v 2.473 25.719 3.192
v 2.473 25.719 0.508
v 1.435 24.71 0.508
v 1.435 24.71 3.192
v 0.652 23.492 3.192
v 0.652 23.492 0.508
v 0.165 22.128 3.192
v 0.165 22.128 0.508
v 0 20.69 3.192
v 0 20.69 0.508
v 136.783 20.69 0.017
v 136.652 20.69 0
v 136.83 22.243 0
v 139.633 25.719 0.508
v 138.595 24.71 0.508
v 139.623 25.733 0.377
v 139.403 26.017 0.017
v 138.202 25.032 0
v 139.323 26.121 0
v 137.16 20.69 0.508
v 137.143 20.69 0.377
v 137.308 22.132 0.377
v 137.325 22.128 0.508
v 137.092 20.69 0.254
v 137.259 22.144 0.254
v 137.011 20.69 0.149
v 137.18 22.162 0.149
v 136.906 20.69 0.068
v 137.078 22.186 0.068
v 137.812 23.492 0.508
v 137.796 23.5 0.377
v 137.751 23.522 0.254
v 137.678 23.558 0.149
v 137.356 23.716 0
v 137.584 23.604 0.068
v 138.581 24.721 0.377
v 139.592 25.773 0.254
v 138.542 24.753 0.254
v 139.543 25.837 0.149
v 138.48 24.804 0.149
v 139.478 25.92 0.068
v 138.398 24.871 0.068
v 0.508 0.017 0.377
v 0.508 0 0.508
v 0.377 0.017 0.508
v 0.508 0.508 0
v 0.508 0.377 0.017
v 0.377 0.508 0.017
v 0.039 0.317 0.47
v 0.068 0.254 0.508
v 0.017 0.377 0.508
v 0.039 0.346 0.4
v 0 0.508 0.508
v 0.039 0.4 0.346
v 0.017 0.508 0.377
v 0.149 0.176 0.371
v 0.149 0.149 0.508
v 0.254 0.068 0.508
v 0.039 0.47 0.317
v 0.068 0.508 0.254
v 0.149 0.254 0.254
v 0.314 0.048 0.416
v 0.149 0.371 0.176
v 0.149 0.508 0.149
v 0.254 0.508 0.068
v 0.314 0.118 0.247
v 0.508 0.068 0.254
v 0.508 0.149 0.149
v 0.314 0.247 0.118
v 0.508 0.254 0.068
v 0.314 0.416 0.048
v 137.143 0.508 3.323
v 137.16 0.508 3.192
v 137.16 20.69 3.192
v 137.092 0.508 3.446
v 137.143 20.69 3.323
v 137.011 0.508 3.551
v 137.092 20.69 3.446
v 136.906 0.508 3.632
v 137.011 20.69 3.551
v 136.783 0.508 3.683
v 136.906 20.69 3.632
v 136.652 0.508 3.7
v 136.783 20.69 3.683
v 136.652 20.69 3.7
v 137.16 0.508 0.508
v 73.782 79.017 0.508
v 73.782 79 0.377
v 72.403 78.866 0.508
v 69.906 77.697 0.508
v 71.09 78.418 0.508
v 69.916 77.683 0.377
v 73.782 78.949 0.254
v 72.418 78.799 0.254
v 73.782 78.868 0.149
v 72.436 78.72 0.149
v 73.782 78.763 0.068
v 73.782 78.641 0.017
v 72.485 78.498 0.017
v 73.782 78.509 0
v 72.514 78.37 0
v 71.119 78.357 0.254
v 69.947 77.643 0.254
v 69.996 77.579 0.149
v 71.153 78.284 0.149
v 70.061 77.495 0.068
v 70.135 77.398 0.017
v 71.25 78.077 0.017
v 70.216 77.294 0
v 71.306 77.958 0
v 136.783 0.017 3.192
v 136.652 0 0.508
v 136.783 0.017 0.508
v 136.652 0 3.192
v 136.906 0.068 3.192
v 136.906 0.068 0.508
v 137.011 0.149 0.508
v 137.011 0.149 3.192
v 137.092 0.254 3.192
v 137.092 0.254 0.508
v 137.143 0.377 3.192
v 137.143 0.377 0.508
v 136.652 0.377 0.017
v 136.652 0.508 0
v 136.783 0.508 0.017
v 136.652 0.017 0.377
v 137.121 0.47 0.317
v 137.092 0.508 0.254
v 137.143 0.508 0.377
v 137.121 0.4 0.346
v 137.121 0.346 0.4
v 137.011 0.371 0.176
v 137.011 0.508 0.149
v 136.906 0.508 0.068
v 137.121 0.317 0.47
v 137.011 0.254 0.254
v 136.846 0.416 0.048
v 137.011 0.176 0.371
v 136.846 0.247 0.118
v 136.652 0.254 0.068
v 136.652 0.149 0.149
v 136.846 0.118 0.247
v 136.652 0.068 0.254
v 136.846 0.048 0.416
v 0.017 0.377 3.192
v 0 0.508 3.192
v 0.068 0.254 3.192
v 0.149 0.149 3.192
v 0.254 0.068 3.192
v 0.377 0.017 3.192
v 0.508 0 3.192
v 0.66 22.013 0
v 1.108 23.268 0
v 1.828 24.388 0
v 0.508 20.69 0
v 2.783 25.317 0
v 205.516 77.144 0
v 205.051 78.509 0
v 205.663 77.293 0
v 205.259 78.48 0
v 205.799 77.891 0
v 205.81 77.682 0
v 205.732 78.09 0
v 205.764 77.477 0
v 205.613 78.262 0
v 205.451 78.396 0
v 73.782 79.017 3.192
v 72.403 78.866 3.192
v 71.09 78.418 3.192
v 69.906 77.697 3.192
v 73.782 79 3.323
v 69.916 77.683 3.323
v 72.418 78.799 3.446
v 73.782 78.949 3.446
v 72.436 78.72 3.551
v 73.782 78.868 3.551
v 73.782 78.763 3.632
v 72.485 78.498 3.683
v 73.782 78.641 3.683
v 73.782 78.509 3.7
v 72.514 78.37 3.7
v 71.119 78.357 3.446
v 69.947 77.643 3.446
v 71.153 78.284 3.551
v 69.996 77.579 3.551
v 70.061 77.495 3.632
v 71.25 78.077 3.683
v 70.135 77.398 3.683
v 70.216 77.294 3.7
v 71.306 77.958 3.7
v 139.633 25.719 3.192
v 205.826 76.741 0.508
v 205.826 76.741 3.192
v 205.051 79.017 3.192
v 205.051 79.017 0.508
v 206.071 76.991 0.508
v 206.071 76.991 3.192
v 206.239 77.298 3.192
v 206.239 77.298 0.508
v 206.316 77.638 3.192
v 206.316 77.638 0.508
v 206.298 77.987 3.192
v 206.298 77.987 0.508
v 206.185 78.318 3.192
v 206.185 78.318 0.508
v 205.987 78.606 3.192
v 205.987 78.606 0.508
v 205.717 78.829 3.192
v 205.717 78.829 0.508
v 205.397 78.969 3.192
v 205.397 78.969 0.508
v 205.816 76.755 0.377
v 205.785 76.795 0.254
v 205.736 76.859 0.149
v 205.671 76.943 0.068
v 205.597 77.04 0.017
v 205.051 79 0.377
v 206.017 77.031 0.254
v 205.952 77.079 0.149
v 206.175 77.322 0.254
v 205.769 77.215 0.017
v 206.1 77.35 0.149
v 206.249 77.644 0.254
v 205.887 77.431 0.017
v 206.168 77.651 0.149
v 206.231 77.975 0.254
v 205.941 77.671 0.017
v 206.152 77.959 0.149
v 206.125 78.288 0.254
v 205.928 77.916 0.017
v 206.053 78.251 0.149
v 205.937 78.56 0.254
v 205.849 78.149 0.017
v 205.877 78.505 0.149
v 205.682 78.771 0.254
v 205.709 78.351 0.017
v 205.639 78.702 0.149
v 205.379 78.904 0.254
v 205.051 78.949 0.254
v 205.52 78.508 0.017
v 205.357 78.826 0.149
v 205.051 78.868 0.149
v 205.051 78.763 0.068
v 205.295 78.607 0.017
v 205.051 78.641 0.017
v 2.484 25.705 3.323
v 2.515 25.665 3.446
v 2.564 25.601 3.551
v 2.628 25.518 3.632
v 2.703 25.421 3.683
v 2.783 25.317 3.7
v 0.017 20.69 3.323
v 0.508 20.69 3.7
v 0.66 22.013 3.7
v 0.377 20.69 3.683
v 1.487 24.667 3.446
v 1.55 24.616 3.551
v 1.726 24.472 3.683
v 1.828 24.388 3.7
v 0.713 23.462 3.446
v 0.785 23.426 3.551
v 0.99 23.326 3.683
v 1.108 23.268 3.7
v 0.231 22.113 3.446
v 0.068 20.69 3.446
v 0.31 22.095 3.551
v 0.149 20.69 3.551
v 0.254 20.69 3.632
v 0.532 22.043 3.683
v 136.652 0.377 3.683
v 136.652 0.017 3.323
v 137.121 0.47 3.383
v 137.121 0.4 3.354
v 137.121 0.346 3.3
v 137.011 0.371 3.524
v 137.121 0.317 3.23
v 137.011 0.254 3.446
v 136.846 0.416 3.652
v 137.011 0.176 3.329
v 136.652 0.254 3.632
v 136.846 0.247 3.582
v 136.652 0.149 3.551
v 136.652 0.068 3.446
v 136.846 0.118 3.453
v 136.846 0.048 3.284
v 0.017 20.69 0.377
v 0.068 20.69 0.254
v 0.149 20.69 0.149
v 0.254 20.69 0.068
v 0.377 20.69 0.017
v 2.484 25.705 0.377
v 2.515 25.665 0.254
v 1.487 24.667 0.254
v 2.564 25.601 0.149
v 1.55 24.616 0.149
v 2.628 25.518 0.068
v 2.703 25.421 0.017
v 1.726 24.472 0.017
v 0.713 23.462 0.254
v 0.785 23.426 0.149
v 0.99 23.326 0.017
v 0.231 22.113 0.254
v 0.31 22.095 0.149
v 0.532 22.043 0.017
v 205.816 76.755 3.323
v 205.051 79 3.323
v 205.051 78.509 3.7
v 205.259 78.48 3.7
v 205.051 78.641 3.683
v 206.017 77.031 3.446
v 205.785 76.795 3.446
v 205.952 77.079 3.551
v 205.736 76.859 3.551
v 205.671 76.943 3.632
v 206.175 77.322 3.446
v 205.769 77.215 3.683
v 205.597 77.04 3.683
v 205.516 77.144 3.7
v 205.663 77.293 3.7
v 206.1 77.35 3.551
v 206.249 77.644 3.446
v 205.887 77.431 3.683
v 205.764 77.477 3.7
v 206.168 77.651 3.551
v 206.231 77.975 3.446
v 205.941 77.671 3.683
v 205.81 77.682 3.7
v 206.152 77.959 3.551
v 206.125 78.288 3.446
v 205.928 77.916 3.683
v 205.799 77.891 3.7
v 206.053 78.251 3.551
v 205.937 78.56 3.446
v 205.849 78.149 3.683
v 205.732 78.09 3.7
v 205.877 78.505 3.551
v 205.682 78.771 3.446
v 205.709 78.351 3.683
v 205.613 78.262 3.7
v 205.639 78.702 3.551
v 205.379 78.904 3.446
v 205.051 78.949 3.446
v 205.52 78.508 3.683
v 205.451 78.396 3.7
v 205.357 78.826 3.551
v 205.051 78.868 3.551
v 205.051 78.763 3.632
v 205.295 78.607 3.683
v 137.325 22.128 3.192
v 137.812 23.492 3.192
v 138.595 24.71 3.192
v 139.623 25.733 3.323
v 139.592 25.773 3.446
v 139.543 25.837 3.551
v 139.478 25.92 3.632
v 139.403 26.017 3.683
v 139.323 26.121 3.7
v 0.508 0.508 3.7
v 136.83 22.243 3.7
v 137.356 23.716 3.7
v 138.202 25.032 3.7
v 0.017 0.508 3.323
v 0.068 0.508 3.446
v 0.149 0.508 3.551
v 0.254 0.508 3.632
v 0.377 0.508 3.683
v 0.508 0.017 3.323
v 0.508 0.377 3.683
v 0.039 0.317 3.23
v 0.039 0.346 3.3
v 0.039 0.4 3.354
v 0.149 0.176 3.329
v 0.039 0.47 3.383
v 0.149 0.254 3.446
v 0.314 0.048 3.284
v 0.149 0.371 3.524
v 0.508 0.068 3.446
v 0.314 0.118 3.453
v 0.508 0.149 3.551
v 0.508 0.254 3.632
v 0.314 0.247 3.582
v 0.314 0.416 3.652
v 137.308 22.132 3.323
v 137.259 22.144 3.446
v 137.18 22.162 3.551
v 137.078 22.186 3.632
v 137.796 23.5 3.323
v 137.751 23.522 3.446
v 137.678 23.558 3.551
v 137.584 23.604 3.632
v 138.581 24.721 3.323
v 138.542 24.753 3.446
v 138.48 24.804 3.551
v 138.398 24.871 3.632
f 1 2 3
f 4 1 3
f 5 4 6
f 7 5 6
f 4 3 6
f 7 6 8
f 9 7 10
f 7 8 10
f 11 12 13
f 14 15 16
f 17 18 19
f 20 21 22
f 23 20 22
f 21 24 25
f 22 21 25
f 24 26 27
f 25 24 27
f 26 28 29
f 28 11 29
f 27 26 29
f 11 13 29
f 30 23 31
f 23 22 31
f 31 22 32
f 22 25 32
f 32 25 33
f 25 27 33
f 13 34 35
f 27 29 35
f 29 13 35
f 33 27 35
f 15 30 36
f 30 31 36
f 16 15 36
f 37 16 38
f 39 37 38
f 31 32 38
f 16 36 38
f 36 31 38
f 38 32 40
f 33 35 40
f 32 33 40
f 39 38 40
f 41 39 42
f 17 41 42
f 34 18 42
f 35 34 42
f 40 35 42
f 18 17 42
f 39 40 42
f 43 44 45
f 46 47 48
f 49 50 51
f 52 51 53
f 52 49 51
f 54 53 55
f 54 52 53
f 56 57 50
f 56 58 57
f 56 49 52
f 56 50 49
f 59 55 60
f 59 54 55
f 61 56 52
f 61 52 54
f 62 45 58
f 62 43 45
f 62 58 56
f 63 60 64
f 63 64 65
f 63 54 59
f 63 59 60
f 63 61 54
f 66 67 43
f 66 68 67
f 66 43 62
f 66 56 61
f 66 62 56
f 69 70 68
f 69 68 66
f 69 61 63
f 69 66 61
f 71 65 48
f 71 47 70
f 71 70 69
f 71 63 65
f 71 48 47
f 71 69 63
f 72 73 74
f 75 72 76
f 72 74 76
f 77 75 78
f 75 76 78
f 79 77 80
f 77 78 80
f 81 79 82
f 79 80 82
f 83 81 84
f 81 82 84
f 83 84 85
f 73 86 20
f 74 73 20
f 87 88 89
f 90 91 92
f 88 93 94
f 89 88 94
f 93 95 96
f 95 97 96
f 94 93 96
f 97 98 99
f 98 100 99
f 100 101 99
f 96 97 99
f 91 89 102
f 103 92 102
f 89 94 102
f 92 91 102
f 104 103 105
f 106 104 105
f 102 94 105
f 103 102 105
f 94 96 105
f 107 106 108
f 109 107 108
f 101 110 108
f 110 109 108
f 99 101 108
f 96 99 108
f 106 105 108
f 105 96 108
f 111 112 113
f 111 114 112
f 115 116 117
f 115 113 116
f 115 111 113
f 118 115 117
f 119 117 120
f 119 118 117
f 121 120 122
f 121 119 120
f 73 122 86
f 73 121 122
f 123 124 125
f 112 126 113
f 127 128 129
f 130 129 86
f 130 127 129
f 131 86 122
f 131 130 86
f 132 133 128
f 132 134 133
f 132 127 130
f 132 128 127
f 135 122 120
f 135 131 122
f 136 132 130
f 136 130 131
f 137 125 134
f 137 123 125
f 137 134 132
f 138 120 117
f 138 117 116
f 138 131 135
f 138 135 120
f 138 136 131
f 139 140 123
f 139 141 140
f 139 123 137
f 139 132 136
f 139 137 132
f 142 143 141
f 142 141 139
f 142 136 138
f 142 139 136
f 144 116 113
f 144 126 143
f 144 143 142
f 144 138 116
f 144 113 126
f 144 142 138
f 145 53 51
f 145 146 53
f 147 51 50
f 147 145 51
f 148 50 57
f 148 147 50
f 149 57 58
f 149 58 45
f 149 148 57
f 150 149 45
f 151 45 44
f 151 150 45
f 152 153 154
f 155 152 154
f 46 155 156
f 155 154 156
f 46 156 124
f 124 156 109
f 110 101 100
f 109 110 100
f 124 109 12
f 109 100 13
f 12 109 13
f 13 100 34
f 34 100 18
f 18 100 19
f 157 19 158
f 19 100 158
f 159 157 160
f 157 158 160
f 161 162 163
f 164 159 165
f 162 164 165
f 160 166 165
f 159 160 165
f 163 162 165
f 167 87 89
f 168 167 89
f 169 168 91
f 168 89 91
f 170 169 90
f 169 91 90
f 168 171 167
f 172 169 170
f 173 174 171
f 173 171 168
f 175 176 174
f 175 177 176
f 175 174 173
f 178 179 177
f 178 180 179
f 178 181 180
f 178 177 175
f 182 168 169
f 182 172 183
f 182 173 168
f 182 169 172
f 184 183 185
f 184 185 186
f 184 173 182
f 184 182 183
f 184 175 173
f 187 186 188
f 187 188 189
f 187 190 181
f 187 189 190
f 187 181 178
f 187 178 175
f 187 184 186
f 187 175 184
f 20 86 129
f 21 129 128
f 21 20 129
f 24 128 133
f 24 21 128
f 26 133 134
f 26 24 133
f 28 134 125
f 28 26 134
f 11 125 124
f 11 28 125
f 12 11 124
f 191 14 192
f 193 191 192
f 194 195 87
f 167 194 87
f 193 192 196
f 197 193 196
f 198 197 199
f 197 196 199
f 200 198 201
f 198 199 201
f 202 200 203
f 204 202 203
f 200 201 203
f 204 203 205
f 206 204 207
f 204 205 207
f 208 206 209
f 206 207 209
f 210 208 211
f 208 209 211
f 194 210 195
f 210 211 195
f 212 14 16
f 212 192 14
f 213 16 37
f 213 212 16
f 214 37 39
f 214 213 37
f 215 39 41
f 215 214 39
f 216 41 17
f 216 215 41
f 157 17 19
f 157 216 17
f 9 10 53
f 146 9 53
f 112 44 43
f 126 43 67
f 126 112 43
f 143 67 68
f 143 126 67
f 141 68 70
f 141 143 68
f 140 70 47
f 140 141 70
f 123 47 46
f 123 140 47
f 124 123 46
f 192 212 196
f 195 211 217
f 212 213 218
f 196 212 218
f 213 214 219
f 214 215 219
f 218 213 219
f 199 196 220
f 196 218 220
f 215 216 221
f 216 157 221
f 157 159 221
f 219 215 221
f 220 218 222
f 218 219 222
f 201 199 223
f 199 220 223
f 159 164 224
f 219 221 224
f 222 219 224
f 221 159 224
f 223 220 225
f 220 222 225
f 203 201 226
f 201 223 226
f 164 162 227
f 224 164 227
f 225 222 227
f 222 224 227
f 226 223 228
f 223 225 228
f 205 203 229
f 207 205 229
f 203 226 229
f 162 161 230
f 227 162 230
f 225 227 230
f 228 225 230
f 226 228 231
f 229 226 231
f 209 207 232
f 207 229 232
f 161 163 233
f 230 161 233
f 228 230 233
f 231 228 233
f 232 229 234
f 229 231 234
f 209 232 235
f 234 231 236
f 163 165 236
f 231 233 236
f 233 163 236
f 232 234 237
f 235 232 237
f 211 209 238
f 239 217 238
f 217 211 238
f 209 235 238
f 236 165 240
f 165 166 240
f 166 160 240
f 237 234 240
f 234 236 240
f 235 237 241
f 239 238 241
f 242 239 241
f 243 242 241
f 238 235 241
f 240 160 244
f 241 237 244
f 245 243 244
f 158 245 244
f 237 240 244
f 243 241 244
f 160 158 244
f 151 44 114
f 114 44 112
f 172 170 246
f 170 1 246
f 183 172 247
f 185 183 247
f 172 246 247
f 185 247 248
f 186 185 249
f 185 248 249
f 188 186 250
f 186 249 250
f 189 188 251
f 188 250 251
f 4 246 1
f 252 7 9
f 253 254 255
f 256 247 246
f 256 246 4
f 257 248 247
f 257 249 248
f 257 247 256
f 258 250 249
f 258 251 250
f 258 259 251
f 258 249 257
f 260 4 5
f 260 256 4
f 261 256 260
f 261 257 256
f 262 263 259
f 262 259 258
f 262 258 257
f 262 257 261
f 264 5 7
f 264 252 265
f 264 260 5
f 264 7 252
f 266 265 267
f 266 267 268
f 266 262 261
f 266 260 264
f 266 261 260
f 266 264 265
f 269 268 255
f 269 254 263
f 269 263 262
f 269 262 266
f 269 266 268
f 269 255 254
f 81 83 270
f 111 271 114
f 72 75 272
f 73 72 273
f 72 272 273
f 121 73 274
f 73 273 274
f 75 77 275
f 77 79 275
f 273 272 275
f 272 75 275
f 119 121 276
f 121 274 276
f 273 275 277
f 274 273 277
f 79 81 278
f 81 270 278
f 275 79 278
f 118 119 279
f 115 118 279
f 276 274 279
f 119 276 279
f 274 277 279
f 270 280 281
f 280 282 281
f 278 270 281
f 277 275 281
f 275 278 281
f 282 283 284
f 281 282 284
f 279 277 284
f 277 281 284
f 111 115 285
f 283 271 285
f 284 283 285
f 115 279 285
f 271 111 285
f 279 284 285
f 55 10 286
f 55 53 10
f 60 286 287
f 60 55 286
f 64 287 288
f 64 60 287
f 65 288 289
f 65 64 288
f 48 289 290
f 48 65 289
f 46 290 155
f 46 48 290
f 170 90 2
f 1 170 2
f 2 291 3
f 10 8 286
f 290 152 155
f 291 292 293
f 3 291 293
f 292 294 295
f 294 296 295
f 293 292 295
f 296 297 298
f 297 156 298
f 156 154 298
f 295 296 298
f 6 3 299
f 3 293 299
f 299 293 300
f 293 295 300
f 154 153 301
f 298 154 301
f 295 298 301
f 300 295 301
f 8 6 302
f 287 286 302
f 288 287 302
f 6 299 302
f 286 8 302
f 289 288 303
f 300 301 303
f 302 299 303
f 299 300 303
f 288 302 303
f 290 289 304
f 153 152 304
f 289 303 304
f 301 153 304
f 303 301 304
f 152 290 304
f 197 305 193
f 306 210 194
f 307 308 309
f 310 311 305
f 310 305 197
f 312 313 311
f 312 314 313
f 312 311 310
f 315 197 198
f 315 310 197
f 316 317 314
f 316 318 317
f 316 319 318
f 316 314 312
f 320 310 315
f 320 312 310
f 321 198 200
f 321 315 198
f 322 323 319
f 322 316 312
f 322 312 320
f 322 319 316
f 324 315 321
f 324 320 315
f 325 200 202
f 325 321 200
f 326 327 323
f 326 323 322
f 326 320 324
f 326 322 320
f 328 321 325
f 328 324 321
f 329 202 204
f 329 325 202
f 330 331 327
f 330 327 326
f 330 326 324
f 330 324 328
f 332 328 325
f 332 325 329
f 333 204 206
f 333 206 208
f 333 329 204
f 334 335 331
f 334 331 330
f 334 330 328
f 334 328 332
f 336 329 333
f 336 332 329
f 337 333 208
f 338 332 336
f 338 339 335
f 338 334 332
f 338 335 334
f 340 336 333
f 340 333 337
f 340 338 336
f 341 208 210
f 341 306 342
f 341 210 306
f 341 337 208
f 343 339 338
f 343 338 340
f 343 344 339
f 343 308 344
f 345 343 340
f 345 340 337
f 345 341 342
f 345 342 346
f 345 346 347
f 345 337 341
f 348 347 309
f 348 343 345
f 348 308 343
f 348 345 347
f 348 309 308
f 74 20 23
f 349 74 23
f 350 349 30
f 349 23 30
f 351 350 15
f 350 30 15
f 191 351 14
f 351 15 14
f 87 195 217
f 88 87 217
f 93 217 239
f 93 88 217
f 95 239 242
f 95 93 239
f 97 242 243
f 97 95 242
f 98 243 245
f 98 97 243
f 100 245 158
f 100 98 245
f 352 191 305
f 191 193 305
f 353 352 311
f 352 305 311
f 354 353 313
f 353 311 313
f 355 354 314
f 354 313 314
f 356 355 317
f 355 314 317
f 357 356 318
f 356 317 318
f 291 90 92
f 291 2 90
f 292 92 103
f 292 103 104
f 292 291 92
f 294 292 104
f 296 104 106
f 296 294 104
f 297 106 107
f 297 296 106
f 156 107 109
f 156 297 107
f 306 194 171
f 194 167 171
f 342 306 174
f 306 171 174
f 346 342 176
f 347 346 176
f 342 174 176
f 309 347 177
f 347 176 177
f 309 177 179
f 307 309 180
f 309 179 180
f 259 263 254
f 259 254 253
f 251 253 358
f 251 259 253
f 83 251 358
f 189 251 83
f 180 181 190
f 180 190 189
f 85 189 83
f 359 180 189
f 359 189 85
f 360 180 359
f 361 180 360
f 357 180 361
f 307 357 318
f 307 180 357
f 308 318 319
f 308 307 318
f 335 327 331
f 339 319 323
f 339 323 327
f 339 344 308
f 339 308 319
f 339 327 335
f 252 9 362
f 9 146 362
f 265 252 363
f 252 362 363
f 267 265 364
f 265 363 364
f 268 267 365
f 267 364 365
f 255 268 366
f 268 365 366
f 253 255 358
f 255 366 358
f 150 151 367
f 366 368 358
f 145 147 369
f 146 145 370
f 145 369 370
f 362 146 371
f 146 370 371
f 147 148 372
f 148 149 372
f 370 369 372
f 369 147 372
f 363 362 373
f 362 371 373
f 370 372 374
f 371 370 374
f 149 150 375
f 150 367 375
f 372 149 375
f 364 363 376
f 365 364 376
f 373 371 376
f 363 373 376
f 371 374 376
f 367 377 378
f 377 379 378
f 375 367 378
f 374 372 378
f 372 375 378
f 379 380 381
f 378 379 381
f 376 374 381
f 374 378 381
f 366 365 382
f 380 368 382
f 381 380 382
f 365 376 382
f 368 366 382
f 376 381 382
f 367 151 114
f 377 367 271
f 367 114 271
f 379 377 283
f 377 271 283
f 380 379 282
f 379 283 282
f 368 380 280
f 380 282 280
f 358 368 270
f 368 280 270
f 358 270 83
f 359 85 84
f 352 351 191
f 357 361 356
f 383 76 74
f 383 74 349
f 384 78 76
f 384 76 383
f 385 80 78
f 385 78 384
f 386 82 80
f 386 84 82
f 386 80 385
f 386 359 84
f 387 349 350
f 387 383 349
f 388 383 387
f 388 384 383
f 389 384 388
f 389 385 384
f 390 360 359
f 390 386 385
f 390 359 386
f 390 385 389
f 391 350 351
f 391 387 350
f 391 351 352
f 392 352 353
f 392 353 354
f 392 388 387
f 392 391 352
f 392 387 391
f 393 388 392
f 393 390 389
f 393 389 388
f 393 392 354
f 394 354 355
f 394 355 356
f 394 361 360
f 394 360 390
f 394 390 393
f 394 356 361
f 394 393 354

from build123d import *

# Parameters (mm, degrees)
F1_DEPTH = 3.7
F2_R     = 0.508


with BuildPart() as f1:
    # F0 (on Top) → F1 (new body)
    with BuildSketch(Plane.XY):
        with BuildLine():
            Line((0, 20.689665), (0, 0))
            Line((0, 0), (137.16, 0))
            Line((137.16, 0), (137.16, 20.689665))
            ThreePointArc((137.16, 20.689665), (137.811787, 23.491961), (139.633343, 25.718982))
            Line((139.633343, 25.718982), (205.826443, 76.7414))
            ThreePointArc((205.826443, 76.7414), (206.253265, 78.156808), (205.051112, 79.017263))
            Line((205.051112, 79.017263), (73.782288, 79.017263))
            ThreePointArc((73.782288, 79.017263), (71.734565, 78.678031), (69.905631, 77.69658))
            Line((69.905631, 77.69658), (2.473343, 25.718982))
            ThreePointArc((2.473343, 25.718982), (0.651787, 23.491961), (0, 20.689665))
        make_face()
    extrude(amount=F1_DEPTH)

    # F2
    f2_edges = [f1.edges().sort_by_distance(p)[0] for p in [
        (68.58, 0, 3.7),
        (68.58, 0, 0),
        (0, 0, 1.85),
        (0, 10.344832, 3.7),
        (137.16, 10.344832, 0),
        (137.16, 0, 1.85),
    ]]
    fillet(f2_edges, radius=F2_R)


solid = f1.part
